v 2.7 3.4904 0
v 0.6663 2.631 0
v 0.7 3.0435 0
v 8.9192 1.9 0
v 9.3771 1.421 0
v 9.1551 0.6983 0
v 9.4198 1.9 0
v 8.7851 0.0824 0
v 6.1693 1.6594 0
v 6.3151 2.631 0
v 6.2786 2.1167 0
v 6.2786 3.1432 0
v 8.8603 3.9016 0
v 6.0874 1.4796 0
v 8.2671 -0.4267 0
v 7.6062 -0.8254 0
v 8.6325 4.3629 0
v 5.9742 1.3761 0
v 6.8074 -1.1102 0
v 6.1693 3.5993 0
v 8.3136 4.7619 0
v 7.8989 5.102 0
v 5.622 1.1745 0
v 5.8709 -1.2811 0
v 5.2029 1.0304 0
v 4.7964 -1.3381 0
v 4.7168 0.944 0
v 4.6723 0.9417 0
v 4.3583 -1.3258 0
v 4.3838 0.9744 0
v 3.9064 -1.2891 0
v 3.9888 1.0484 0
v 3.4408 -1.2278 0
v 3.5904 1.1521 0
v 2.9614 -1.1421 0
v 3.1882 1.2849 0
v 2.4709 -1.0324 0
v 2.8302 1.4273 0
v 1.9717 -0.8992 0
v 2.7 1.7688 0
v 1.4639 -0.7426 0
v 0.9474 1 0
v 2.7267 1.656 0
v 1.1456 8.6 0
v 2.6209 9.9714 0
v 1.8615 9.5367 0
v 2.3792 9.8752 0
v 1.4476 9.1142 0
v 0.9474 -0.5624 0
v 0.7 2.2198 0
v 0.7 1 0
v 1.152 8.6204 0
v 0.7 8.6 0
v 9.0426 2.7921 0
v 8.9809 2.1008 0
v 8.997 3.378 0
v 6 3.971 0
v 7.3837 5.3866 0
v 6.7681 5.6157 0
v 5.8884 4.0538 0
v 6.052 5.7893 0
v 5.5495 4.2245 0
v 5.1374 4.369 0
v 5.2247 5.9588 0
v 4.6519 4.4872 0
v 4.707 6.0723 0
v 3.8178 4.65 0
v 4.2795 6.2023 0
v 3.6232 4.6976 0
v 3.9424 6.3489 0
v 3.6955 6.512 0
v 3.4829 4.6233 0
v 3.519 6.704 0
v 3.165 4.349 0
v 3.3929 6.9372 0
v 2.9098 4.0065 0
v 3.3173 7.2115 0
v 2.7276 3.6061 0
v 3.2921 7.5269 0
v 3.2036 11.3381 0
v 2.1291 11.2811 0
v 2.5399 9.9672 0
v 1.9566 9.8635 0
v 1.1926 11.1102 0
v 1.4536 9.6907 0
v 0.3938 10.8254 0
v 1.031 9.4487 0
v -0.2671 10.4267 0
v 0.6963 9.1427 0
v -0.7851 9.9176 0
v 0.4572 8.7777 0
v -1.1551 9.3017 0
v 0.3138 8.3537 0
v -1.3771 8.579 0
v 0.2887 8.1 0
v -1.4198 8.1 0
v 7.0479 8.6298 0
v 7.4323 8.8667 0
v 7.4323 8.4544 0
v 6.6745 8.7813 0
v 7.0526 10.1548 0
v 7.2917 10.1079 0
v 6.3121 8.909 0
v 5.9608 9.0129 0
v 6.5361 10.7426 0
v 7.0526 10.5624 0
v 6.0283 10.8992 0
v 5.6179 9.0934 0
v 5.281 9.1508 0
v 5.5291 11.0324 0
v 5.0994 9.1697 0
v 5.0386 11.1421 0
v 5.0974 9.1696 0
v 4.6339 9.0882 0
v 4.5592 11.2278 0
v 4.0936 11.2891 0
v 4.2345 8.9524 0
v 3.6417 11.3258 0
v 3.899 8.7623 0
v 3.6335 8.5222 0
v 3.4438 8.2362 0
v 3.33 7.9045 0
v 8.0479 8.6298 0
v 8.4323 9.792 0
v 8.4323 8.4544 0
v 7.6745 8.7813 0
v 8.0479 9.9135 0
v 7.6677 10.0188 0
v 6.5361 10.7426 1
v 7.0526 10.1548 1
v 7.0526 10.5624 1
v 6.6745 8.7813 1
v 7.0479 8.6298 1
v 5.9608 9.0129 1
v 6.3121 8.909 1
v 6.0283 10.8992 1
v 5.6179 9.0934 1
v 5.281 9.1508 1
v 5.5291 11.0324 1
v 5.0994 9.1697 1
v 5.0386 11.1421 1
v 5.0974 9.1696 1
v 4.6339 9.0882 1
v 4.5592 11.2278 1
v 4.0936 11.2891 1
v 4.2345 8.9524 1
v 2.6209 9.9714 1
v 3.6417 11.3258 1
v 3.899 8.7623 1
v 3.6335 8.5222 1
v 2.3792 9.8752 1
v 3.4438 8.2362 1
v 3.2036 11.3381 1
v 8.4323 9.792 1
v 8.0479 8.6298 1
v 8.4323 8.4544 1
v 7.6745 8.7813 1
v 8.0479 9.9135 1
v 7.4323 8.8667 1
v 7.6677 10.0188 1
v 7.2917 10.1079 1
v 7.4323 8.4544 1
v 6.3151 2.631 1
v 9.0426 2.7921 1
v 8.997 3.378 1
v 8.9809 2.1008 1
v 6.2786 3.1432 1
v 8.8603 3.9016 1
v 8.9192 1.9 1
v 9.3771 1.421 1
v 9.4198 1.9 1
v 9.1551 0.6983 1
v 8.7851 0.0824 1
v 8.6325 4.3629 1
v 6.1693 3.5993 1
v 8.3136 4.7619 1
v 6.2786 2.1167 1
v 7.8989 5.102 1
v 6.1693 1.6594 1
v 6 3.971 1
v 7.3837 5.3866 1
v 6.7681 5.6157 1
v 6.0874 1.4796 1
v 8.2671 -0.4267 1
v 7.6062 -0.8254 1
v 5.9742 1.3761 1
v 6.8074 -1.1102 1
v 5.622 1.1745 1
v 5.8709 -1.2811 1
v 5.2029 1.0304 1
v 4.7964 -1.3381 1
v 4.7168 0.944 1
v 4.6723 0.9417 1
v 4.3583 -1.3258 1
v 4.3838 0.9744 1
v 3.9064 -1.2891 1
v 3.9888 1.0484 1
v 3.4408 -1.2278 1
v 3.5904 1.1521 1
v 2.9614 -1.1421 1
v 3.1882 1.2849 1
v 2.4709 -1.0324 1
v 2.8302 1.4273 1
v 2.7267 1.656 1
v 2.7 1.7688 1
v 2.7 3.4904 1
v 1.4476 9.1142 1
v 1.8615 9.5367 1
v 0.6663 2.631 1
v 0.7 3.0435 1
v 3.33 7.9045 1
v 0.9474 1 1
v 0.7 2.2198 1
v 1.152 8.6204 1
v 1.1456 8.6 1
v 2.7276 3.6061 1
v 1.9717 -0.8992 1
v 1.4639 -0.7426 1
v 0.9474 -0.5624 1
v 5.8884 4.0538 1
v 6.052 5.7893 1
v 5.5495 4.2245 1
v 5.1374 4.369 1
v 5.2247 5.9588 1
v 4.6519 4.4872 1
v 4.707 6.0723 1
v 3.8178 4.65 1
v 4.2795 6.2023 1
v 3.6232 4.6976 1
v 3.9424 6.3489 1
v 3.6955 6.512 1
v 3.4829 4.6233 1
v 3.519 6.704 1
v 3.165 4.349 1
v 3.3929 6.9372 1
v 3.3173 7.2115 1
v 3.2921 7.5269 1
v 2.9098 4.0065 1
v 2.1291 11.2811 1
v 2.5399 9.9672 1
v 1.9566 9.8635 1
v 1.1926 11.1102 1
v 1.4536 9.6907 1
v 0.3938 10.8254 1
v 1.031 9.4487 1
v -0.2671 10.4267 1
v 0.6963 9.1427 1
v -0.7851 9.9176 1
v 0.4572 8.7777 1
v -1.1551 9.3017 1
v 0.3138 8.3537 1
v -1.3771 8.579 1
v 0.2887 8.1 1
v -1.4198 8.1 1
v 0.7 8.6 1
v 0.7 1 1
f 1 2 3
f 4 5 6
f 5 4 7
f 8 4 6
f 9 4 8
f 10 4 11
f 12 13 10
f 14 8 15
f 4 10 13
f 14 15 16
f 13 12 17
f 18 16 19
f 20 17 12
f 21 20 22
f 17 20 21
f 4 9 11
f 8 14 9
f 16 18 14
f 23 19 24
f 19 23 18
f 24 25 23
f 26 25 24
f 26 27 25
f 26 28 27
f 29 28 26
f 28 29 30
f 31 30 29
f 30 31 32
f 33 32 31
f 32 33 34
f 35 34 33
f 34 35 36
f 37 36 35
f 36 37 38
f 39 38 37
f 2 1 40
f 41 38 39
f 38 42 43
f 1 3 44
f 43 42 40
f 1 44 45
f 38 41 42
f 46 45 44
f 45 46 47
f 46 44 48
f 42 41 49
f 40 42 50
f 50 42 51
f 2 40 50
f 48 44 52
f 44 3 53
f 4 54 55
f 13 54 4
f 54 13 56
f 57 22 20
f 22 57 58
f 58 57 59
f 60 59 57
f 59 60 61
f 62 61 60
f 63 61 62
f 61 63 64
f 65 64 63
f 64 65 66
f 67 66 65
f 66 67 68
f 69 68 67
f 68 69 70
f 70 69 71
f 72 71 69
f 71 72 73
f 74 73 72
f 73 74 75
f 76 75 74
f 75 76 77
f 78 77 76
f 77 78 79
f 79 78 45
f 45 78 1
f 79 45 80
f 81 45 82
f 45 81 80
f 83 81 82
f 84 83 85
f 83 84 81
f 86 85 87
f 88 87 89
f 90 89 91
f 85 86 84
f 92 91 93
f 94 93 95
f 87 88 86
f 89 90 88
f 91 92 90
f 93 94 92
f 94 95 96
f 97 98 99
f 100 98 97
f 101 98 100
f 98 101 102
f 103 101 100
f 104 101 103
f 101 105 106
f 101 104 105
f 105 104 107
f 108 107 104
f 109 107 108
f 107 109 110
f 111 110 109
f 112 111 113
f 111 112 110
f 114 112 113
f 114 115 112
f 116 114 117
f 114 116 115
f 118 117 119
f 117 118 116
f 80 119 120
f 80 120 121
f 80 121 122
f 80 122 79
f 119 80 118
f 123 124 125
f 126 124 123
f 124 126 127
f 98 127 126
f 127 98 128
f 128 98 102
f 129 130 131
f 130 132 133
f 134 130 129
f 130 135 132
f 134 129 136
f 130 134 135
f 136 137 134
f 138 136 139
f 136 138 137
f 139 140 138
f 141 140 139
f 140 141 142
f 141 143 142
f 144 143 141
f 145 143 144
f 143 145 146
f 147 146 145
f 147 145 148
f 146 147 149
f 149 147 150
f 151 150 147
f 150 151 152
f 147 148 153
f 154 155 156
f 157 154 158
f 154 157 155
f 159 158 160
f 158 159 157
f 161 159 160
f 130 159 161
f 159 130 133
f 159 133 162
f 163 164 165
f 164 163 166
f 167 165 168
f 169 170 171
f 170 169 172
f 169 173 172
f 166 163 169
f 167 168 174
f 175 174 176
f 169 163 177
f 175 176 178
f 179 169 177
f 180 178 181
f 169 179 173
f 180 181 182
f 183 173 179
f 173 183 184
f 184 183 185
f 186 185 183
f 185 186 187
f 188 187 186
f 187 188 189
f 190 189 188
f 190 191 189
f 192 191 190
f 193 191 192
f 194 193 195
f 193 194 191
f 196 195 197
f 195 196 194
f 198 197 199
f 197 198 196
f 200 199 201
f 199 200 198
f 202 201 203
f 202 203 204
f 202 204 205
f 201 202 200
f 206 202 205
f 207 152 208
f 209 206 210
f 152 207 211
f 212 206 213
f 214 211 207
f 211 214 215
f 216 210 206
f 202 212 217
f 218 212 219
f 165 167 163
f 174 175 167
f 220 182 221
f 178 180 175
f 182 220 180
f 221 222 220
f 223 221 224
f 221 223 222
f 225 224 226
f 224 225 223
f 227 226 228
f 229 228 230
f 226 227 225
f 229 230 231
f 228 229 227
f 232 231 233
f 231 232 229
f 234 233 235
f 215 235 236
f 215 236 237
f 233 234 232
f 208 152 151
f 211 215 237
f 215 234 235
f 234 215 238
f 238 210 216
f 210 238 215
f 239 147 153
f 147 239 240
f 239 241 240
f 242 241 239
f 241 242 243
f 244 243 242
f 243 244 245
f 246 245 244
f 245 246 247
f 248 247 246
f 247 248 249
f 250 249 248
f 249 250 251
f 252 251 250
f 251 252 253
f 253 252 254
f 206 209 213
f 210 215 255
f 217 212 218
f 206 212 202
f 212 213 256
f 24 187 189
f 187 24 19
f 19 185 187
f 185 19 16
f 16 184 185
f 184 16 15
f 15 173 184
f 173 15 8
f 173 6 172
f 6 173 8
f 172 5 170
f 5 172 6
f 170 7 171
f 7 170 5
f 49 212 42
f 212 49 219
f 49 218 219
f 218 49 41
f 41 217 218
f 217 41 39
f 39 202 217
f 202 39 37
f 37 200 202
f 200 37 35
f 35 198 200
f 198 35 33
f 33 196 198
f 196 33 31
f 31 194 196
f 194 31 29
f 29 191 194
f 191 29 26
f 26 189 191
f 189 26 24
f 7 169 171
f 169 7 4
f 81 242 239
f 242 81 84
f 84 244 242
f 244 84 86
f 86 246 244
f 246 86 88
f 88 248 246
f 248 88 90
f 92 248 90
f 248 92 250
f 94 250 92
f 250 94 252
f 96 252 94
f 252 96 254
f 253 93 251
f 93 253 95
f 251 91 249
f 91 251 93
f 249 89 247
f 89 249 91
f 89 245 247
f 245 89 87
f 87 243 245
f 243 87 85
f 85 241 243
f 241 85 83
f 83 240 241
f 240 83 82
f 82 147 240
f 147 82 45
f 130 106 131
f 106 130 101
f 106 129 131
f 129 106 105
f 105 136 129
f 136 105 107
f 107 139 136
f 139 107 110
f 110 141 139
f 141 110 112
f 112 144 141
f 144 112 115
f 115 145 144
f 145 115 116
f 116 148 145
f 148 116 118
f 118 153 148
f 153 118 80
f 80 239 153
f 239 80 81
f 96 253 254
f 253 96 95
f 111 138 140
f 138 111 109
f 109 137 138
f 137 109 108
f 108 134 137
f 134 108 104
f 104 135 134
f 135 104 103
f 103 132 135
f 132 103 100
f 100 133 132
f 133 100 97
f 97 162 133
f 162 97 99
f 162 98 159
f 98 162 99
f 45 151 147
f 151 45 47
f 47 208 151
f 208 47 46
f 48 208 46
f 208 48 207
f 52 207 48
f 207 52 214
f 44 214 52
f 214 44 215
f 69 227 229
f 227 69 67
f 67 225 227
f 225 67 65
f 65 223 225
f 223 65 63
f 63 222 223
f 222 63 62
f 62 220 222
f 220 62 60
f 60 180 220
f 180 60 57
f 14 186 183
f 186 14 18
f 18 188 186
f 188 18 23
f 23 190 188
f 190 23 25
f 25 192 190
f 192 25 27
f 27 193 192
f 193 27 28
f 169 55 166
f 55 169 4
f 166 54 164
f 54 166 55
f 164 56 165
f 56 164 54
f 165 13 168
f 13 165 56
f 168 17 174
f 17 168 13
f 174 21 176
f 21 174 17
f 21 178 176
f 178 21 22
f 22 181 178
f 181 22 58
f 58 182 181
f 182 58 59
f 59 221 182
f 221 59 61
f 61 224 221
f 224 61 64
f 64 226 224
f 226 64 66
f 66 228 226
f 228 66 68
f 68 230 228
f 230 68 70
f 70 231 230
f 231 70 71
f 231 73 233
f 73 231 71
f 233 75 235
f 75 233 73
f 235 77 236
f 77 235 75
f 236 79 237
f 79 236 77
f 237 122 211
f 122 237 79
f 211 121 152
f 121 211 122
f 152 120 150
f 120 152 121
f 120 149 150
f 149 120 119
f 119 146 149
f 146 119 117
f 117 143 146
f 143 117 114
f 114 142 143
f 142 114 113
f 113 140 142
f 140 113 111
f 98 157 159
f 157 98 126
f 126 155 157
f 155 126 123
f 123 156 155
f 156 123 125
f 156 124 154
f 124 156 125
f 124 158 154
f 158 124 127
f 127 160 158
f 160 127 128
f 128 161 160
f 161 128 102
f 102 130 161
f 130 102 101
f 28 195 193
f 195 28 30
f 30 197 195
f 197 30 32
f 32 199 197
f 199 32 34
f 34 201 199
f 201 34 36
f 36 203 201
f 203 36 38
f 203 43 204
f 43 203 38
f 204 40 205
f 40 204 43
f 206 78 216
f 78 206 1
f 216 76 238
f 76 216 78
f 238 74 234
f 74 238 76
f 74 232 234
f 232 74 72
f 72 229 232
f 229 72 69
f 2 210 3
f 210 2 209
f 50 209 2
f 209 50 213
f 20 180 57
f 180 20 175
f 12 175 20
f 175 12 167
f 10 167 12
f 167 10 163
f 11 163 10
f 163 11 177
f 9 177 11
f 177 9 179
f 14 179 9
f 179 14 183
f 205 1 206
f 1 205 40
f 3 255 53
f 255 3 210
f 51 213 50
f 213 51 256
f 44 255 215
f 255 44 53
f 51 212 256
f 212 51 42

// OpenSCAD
linear_extrude(1)
text("S", font="Iosevka Slab");

linear_extrude(1)
translate([1, 0, 0])
 text("S", font="Iosevka Slab");
 
translate([-0.8,-0.5,0])
scale([1.2,1.2,1])
difference(){
    
    linear_extrude(1)
    translate([0.5, -0.5, 0])
     text("S", font="Iosevka Slab");
    
    translate([0, 2, -5])
    color("#f00")
    cube([10, 10, 10]);
    
}
    
rotate([0, 0, 180])
translate([-8.8,-10.5,0])
scale([1.2,1.2,1])
difference(){
    
    linear_extrude(1)
    translate([0.5, -0.5, 0])
     text("S", font="Iosevka Slab");
    
    translate([0, 2, -5])
    color("#f00")
    cube([10, 10, 10]);
    
}

translate([0,0,0])
scale([1,0.8,1])
linear_extrude(1)
translate([0.5, -0.5, 0])
 text("o", font="Iosevka Slab");


translate([-0.6,0,0])
scale([1,0.8,1])
linear_extrude(1)
translate([0.5, -0.5, 0])
 text("o", font="Iosevka Slab");

translate([0.7,1])
cube([2, 7.6, 1]);
